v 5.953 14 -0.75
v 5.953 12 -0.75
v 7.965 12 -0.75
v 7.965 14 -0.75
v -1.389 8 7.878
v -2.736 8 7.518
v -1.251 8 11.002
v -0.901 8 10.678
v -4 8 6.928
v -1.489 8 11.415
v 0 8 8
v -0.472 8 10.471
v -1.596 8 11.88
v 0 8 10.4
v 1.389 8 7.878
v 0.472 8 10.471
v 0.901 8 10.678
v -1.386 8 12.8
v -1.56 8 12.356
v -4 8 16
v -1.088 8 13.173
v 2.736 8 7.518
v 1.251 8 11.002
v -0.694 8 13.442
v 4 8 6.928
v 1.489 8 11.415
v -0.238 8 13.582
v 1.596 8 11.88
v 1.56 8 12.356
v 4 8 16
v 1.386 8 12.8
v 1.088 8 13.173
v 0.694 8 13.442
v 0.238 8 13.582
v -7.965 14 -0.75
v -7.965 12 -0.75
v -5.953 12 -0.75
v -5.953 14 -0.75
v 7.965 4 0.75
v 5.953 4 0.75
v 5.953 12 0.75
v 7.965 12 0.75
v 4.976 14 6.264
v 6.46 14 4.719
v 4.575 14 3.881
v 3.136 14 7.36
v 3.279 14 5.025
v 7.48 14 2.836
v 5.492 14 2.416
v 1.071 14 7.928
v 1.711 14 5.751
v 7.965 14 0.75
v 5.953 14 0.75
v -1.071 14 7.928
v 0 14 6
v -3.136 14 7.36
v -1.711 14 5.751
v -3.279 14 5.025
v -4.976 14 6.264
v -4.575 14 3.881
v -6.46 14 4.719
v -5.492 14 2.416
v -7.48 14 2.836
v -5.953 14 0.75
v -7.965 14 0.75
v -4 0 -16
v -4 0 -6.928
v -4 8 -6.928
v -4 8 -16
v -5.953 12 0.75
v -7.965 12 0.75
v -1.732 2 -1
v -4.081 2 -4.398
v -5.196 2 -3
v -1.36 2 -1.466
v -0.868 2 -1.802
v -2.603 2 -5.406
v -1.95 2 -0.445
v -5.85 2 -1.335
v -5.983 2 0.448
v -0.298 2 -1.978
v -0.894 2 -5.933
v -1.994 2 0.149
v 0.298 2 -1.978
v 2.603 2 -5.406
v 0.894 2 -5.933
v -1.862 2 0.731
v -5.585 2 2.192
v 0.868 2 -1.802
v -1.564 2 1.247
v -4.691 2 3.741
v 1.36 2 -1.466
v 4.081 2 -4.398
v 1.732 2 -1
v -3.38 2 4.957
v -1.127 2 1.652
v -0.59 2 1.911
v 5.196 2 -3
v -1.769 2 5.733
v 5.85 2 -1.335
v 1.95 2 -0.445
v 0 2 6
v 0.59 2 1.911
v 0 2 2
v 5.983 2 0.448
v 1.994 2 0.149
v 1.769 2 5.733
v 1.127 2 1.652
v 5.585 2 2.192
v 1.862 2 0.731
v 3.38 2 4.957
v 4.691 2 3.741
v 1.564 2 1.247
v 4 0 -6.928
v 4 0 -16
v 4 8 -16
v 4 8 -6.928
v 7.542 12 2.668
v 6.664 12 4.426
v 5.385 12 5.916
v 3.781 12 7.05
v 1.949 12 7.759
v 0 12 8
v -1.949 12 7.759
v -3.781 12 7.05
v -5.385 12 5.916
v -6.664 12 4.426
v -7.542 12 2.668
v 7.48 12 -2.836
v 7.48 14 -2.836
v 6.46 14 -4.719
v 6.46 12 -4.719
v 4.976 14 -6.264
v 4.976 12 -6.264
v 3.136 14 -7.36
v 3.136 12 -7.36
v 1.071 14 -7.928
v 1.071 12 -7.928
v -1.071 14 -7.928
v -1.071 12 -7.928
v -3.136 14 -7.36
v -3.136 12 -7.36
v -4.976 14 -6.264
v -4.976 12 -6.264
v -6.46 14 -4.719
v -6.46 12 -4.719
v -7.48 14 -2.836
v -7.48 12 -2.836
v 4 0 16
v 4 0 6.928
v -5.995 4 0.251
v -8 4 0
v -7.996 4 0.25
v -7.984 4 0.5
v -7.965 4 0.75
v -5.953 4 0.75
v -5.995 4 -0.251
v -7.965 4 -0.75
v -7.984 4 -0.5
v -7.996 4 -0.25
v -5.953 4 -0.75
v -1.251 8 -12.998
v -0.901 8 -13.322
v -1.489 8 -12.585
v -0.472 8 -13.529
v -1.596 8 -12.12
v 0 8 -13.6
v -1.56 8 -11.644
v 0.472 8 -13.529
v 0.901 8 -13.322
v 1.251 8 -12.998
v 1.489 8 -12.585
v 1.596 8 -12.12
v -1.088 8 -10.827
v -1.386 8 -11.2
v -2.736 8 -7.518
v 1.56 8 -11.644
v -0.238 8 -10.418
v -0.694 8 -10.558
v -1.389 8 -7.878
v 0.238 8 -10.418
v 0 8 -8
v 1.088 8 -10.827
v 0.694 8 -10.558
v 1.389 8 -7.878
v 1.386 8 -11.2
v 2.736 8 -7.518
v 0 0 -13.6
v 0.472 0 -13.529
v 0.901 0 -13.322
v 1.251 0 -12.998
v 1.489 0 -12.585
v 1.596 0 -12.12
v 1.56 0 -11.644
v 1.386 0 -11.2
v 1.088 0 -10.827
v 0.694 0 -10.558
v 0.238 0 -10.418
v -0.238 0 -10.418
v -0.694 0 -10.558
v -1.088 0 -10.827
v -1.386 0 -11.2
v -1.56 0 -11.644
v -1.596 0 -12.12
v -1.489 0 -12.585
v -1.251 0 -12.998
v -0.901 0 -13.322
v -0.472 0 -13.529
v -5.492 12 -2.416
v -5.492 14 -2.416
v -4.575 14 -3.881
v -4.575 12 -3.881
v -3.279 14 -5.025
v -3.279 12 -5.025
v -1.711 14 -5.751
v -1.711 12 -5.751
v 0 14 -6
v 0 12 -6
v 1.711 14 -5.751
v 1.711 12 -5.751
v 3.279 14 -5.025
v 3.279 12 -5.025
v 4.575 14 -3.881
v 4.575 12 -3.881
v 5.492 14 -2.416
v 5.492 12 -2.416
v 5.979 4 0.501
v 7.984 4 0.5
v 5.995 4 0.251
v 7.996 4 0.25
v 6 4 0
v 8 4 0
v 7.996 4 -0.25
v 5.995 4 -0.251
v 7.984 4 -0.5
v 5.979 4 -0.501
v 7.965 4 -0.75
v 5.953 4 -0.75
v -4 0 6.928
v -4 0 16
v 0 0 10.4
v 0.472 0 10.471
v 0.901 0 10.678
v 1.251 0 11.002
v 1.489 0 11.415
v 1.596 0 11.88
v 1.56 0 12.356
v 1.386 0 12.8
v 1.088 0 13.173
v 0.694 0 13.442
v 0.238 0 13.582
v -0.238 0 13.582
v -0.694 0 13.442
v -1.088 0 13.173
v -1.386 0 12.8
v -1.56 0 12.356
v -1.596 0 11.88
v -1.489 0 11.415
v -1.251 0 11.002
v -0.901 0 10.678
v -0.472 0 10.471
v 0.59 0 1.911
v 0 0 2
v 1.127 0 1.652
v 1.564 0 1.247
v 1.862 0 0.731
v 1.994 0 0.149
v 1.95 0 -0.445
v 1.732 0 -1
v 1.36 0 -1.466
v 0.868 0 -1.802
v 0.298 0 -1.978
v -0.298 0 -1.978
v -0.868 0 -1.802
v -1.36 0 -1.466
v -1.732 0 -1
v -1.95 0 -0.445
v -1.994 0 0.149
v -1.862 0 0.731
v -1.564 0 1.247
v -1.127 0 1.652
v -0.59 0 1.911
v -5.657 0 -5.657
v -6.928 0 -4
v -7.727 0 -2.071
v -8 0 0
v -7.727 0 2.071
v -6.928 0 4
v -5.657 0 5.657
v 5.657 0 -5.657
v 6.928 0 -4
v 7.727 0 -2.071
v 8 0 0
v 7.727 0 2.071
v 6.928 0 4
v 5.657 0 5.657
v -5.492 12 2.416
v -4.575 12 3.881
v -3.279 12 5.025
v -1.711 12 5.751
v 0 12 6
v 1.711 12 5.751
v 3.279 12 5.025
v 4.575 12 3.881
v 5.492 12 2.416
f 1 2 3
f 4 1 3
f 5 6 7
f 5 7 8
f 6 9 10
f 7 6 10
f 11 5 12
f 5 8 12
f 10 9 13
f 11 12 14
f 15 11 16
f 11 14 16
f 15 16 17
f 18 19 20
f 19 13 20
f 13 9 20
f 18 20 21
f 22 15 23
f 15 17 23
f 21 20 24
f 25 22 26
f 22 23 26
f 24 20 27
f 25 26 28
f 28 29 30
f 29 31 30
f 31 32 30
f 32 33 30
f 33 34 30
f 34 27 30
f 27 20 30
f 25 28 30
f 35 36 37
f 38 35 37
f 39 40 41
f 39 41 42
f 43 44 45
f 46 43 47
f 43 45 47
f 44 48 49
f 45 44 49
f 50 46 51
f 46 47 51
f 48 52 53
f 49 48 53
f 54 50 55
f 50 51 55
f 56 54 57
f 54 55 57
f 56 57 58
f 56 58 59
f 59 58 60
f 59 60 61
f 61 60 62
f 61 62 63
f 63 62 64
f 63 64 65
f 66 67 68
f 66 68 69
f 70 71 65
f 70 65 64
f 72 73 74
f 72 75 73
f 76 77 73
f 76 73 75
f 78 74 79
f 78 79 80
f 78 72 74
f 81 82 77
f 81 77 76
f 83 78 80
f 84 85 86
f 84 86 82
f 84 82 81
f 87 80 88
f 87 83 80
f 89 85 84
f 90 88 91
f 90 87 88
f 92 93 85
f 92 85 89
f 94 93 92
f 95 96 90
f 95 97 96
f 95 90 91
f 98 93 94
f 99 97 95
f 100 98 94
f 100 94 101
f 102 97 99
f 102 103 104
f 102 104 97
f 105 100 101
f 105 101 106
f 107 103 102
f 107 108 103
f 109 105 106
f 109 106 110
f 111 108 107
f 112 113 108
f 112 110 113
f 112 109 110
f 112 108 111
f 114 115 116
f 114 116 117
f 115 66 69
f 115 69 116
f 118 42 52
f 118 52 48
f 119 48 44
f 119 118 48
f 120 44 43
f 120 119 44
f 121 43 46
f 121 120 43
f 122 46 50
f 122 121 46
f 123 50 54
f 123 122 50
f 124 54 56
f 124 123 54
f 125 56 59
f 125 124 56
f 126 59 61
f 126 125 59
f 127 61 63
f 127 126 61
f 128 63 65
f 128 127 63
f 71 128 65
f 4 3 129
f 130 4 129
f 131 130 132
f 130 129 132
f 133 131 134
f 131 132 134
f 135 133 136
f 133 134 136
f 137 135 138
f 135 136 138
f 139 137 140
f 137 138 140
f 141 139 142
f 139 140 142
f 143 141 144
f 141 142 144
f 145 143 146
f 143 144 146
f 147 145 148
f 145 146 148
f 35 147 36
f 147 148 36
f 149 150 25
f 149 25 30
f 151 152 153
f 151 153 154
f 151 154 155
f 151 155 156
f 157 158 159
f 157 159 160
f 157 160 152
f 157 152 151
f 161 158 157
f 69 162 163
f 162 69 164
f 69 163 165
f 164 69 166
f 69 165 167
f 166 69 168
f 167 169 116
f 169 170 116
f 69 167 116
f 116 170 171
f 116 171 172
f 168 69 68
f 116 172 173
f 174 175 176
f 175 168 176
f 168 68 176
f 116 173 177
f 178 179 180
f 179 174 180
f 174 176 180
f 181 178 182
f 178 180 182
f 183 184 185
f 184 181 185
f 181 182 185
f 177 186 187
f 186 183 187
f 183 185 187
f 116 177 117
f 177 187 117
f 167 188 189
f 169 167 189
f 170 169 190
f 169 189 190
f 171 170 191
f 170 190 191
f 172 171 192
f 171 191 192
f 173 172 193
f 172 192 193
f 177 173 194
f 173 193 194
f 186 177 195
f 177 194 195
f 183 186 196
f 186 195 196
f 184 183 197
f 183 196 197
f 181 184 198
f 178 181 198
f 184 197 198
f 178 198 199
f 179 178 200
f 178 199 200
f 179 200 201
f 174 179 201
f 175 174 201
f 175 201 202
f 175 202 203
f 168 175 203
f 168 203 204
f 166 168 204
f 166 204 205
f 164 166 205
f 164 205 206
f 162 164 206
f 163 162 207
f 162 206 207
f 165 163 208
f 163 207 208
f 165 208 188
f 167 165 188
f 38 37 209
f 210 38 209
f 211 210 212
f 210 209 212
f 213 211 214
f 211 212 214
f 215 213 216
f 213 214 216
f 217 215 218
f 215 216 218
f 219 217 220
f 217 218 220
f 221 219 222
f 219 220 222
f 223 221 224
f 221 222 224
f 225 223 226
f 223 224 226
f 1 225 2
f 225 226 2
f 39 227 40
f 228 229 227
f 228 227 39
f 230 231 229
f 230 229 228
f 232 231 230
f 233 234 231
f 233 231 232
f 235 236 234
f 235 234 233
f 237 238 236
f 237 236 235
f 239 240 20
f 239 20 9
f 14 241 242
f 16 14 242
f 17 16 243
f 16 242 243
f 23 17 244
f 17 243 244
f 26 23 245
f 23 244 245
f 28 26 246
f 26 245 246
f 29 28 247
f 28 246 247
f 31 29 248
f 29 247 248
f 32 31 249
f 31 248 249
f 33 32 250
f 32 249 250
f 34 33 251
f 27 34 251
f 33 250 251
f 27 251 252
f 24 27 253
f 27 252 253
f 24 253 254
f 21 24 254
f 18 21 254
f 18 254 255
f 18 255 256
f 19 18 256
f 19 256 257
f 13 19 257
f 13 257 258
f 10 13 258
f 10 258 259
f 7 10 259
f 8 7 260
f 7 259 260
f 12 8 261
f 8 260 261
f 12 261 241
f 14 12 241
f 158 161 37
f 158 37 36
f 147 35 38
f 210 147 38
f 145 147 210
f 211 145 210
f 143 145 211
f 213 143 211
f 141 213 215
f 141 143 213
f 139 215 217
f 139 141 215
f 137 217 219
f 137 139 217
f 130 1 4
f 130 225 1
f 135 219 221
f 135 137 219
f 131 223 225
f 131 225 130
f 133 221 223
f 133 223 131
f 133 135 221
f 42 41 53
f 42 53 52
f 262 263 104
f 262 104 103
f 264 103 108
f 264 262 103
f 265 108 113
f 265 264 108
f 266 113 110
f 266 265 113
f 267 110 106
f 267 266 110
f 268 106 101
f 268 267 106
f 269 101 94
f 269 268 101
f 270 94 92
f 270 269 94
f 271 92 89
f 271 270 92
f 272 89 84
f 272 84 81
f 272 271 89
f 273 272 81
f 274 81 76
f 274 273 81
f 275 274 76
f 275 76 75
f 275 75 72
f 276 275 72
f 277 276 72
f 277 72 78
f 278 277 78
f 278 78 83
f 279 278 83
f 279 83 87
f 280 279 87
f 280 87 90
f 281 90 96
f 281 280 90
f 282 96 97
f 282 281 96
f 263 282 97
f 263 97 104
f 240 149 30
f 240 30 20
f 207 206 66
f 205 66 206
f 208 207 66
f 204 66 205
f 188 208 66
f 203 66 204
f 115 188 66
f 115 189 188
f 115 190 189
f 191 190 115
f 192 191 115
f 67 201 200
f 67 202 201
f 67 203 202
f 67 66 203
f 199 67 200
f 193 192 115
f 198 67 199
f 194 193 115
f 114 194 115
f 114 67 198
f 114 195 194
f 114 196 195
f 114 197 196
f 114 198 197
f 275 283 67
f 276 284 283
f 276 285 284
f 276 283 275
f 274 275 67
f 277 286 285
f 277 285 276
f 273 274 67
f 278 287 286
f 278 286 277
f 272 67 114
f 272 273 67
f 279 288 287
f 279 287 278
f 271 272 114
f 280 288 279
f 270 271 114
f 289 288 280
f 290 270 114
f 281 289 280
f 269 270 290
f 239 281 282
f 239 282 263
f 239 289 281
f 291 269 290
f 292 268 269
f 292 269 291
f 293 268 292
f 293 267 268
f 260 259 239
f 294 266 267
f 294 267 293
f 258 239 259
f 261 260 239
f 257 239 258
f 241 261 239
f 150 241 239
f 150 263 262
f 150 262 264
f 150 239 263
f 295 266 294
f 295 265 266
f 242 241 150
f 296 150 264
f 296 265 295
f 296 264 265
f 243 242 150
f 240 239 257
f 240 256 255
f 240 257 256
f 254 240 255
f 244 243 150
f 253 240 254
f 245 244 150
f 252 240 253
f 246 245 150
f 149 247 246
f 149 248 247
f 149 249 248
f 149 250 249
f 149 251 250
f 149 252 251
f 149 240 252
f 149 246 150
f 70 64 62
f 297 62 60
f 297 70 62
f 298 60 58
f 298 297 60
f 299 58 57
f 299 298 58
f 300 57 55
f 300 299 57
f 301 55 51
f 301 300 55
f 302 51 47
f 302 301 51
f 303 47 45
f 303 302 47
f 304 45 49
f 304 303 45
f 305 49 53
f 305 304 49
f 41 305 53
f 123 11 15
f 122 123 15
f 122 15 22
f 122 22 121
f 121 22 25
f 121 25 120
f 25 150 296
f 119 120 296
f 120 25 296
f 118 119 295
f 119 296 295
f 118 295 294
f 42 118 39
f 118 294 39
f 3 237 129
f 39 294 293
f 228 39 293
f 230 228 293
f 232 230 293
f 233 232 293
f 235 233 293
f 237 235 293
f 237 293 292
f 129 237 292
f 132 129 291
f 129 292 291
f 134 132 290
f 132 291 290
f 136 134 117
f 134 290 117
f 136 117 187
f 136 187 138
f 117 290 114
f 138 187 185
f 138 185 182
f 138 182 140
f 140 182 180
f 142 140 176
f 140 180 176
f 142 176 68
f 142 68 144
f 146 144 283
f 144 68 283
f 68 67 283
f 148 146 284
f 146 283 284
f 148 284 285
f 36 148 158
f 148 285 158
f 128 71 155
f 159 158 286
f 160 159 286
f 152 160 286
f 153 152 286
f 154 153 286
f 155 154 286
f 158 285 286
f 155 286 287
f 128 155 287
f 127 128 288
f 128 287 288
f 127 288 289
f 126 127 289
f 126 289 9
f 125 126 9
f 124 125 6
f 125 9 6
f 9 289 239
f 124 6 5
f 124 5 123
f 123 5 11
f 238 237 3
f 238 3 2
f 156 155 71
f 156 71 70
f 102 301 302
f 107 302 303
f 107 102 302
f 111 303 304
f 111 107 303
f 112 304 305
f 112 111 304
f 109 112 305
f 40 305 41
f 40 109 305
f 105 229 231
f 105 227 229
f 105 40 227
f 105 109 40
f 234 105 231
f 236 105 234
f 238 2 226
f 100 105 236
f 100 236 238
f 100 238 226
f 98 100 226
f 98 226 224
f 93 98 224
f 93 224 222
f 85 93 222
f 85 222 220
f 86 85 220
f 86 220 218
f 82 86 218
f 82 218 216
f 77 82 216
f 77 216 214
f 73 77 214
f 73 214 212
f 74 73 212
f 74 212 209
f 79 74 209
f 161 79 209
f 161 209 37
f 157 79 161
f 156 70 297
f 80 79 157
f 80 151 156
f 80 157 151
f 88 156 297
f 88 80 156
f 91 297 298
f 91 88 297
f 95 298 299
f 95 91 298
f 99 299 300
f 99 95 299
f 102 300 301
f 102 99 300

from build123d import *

# Parameters (mm, degrees)
ESQUISSE1_R             = 8
ESQUISSE1_R_2           = 6
BOSS_EXTRU_1_DEPTH      = 12
ESQUISSE1_3_R           = 6
ESQUISSE1_3_R_2         = 2
BOSS_EXTRU_2_DEPTH      = 2
ENL_V_START             = -8
ENL_V_MAT_EXTRU_1_DEPTH = 8
ESQUISSE3_R             = 1.6
BOSS_EXTRU_5_DEPTH      = 8
BOSS_EXTRU_6_DEPTH      = 2


with BuildPart() as part:
    # Esquisse1 → Boss.-Extru.1 (new body)
    with BuildSketch(Plane(origin=(0, 0, 0), x_dir=(1, 0, 0), z_dir=(0, 1, 0))):
        Circle(ESQUISSE1_R)
        Circle(ESQUISSE1_R_2, mode=Mode.SUBTRACT)
    extrude(amount=BOSS_EXTRU_1_DEPTH)

    # Esquisse1<3> → Boss.-Extru.2 (add)
    with BuildSketch(Plane(origin=(0, 0, 0), x_dir=(1, 0, 0), z_dir=(0, 1, 0))):
        Circle(ESQUISSE1_3_R)
        Circle(ESQUISSE1_3_R_2, mode=Mode.SUBTRACT)
    extrude(amount=BOSS_EXTRU_2_DEPTH)

    # Esquisse2 → Enlèv. mat.-Extru.1 (cut)
    with BuildSketch(Plane(origin=(0, 12, 0), x_dir=(1, 0, 0), z_dir=(0, 1, 0)).offset(ENL_V_START)):
        with BuildLine():
            ThreePointArc((-7.964766161, 0.75), (-8, 0), (-7.964766161, -0.75))
            Line((-7.964766161, -0.75), (-5.95294045, -0.75))
            ThreePointArc((-5.95294045, -0.75), (-6, 0), (-5.95294045, 0.75))
            Line((-5.95294045, 0.75), (-7.964766161, 0.75))
        make_face()
        with BuildLine():
            ThreePointArc((7.964766161, -0.75), (8, 0), (7.964766161, 0.75))
            Line((7.964766161, 0.75), (5.95294045, 0.75))
            ThreePointArc((5.95294045, 0.75), (6, 0), (5.95294045, -0.75))
            Line((5.95294045, -0.75), (7.964766161, -0.75))
        make_face()
    extrude(amount=ENL_V_MAT_EXTRU_1_DEPTH, mode=Mode.SUBTRACT)

    # Esquisse3 → Boss.-Extru.5 (add)
    # profile 1 of 2: a face of its own
    with BuildSketch(Plane.XZ):
        with BuildLine():
            Line((-4, -16), (4, -16))
            Line((4, -16), (4, -6.92820323))
            ThreePointArc((4, -6.92820323), (2.070552361, -7.72740661), (0, -8))
            ThreePointArc((0, -8), (-2.070552361, -7.72740661), (-4, -6.92820323))
            Line((-4, -6.92820323), (-4, -16))
        make_face()
        with Locations((0, -12)):
            Circle(ESQUISSE3_R, mode=Mode.SUBTRACT)
    # profile 2 of 2: a face of its own
    with BuildSketch(Plane.XZ):
        with BuildLine():
            Line((-4, 16), (-4, 6.92820323))
            ThreePointArc((-4, 6.92820323), (0, 8), (4, 6.92820323))
            Line((4, 6.92820323), (4, 16))
            Line((4, 16), (-4, 16))
        make_face()
        with Locations((0, 12)):
            Circle(ESQUISSE3_R, mode=Mode.SUBTRACT)
    extrude(amount=-BOSS_EXTRU_5_DEPTH)

    # Esquisse4 → Boss.-Extru.6 (add)
    with BuildSketch(Plane(origin=(0, 12, 0), x_dir=(1, 0, 0), z_dir=(0, 1, 0))):
        with BuildLine():
            Line((-5.95294045, -0.75), (-7.964766161, -0.75))
            ThreePointArc((-7.964766161, -0.75), (0, -8), (7.964766161, -0.75))
            Line((7.964766161, -0.75), (5.95294045, -0.75))
            ThreePointArc((5.95294045, -0.75), (0, -6), (-5.95294045, -0.75))
        make_face()
        with BuildLine():
            ThreePointArc((-5.95294045, 0.75), (0, 6), (5.95294045, 0.75))
            Line((5.95294045, 0.75), (7.964766161, 0.75))
            ThreePointArc((7.964766161, 0.75), (0, 8), (-7.964766161, 0.75))
            Line((-7.964766161, 0.75), (-5.95294045, 0.75))
        make_face()
    extrude(amount=BOSS_EXTRU_6_DEPTH)


solid = part.part
